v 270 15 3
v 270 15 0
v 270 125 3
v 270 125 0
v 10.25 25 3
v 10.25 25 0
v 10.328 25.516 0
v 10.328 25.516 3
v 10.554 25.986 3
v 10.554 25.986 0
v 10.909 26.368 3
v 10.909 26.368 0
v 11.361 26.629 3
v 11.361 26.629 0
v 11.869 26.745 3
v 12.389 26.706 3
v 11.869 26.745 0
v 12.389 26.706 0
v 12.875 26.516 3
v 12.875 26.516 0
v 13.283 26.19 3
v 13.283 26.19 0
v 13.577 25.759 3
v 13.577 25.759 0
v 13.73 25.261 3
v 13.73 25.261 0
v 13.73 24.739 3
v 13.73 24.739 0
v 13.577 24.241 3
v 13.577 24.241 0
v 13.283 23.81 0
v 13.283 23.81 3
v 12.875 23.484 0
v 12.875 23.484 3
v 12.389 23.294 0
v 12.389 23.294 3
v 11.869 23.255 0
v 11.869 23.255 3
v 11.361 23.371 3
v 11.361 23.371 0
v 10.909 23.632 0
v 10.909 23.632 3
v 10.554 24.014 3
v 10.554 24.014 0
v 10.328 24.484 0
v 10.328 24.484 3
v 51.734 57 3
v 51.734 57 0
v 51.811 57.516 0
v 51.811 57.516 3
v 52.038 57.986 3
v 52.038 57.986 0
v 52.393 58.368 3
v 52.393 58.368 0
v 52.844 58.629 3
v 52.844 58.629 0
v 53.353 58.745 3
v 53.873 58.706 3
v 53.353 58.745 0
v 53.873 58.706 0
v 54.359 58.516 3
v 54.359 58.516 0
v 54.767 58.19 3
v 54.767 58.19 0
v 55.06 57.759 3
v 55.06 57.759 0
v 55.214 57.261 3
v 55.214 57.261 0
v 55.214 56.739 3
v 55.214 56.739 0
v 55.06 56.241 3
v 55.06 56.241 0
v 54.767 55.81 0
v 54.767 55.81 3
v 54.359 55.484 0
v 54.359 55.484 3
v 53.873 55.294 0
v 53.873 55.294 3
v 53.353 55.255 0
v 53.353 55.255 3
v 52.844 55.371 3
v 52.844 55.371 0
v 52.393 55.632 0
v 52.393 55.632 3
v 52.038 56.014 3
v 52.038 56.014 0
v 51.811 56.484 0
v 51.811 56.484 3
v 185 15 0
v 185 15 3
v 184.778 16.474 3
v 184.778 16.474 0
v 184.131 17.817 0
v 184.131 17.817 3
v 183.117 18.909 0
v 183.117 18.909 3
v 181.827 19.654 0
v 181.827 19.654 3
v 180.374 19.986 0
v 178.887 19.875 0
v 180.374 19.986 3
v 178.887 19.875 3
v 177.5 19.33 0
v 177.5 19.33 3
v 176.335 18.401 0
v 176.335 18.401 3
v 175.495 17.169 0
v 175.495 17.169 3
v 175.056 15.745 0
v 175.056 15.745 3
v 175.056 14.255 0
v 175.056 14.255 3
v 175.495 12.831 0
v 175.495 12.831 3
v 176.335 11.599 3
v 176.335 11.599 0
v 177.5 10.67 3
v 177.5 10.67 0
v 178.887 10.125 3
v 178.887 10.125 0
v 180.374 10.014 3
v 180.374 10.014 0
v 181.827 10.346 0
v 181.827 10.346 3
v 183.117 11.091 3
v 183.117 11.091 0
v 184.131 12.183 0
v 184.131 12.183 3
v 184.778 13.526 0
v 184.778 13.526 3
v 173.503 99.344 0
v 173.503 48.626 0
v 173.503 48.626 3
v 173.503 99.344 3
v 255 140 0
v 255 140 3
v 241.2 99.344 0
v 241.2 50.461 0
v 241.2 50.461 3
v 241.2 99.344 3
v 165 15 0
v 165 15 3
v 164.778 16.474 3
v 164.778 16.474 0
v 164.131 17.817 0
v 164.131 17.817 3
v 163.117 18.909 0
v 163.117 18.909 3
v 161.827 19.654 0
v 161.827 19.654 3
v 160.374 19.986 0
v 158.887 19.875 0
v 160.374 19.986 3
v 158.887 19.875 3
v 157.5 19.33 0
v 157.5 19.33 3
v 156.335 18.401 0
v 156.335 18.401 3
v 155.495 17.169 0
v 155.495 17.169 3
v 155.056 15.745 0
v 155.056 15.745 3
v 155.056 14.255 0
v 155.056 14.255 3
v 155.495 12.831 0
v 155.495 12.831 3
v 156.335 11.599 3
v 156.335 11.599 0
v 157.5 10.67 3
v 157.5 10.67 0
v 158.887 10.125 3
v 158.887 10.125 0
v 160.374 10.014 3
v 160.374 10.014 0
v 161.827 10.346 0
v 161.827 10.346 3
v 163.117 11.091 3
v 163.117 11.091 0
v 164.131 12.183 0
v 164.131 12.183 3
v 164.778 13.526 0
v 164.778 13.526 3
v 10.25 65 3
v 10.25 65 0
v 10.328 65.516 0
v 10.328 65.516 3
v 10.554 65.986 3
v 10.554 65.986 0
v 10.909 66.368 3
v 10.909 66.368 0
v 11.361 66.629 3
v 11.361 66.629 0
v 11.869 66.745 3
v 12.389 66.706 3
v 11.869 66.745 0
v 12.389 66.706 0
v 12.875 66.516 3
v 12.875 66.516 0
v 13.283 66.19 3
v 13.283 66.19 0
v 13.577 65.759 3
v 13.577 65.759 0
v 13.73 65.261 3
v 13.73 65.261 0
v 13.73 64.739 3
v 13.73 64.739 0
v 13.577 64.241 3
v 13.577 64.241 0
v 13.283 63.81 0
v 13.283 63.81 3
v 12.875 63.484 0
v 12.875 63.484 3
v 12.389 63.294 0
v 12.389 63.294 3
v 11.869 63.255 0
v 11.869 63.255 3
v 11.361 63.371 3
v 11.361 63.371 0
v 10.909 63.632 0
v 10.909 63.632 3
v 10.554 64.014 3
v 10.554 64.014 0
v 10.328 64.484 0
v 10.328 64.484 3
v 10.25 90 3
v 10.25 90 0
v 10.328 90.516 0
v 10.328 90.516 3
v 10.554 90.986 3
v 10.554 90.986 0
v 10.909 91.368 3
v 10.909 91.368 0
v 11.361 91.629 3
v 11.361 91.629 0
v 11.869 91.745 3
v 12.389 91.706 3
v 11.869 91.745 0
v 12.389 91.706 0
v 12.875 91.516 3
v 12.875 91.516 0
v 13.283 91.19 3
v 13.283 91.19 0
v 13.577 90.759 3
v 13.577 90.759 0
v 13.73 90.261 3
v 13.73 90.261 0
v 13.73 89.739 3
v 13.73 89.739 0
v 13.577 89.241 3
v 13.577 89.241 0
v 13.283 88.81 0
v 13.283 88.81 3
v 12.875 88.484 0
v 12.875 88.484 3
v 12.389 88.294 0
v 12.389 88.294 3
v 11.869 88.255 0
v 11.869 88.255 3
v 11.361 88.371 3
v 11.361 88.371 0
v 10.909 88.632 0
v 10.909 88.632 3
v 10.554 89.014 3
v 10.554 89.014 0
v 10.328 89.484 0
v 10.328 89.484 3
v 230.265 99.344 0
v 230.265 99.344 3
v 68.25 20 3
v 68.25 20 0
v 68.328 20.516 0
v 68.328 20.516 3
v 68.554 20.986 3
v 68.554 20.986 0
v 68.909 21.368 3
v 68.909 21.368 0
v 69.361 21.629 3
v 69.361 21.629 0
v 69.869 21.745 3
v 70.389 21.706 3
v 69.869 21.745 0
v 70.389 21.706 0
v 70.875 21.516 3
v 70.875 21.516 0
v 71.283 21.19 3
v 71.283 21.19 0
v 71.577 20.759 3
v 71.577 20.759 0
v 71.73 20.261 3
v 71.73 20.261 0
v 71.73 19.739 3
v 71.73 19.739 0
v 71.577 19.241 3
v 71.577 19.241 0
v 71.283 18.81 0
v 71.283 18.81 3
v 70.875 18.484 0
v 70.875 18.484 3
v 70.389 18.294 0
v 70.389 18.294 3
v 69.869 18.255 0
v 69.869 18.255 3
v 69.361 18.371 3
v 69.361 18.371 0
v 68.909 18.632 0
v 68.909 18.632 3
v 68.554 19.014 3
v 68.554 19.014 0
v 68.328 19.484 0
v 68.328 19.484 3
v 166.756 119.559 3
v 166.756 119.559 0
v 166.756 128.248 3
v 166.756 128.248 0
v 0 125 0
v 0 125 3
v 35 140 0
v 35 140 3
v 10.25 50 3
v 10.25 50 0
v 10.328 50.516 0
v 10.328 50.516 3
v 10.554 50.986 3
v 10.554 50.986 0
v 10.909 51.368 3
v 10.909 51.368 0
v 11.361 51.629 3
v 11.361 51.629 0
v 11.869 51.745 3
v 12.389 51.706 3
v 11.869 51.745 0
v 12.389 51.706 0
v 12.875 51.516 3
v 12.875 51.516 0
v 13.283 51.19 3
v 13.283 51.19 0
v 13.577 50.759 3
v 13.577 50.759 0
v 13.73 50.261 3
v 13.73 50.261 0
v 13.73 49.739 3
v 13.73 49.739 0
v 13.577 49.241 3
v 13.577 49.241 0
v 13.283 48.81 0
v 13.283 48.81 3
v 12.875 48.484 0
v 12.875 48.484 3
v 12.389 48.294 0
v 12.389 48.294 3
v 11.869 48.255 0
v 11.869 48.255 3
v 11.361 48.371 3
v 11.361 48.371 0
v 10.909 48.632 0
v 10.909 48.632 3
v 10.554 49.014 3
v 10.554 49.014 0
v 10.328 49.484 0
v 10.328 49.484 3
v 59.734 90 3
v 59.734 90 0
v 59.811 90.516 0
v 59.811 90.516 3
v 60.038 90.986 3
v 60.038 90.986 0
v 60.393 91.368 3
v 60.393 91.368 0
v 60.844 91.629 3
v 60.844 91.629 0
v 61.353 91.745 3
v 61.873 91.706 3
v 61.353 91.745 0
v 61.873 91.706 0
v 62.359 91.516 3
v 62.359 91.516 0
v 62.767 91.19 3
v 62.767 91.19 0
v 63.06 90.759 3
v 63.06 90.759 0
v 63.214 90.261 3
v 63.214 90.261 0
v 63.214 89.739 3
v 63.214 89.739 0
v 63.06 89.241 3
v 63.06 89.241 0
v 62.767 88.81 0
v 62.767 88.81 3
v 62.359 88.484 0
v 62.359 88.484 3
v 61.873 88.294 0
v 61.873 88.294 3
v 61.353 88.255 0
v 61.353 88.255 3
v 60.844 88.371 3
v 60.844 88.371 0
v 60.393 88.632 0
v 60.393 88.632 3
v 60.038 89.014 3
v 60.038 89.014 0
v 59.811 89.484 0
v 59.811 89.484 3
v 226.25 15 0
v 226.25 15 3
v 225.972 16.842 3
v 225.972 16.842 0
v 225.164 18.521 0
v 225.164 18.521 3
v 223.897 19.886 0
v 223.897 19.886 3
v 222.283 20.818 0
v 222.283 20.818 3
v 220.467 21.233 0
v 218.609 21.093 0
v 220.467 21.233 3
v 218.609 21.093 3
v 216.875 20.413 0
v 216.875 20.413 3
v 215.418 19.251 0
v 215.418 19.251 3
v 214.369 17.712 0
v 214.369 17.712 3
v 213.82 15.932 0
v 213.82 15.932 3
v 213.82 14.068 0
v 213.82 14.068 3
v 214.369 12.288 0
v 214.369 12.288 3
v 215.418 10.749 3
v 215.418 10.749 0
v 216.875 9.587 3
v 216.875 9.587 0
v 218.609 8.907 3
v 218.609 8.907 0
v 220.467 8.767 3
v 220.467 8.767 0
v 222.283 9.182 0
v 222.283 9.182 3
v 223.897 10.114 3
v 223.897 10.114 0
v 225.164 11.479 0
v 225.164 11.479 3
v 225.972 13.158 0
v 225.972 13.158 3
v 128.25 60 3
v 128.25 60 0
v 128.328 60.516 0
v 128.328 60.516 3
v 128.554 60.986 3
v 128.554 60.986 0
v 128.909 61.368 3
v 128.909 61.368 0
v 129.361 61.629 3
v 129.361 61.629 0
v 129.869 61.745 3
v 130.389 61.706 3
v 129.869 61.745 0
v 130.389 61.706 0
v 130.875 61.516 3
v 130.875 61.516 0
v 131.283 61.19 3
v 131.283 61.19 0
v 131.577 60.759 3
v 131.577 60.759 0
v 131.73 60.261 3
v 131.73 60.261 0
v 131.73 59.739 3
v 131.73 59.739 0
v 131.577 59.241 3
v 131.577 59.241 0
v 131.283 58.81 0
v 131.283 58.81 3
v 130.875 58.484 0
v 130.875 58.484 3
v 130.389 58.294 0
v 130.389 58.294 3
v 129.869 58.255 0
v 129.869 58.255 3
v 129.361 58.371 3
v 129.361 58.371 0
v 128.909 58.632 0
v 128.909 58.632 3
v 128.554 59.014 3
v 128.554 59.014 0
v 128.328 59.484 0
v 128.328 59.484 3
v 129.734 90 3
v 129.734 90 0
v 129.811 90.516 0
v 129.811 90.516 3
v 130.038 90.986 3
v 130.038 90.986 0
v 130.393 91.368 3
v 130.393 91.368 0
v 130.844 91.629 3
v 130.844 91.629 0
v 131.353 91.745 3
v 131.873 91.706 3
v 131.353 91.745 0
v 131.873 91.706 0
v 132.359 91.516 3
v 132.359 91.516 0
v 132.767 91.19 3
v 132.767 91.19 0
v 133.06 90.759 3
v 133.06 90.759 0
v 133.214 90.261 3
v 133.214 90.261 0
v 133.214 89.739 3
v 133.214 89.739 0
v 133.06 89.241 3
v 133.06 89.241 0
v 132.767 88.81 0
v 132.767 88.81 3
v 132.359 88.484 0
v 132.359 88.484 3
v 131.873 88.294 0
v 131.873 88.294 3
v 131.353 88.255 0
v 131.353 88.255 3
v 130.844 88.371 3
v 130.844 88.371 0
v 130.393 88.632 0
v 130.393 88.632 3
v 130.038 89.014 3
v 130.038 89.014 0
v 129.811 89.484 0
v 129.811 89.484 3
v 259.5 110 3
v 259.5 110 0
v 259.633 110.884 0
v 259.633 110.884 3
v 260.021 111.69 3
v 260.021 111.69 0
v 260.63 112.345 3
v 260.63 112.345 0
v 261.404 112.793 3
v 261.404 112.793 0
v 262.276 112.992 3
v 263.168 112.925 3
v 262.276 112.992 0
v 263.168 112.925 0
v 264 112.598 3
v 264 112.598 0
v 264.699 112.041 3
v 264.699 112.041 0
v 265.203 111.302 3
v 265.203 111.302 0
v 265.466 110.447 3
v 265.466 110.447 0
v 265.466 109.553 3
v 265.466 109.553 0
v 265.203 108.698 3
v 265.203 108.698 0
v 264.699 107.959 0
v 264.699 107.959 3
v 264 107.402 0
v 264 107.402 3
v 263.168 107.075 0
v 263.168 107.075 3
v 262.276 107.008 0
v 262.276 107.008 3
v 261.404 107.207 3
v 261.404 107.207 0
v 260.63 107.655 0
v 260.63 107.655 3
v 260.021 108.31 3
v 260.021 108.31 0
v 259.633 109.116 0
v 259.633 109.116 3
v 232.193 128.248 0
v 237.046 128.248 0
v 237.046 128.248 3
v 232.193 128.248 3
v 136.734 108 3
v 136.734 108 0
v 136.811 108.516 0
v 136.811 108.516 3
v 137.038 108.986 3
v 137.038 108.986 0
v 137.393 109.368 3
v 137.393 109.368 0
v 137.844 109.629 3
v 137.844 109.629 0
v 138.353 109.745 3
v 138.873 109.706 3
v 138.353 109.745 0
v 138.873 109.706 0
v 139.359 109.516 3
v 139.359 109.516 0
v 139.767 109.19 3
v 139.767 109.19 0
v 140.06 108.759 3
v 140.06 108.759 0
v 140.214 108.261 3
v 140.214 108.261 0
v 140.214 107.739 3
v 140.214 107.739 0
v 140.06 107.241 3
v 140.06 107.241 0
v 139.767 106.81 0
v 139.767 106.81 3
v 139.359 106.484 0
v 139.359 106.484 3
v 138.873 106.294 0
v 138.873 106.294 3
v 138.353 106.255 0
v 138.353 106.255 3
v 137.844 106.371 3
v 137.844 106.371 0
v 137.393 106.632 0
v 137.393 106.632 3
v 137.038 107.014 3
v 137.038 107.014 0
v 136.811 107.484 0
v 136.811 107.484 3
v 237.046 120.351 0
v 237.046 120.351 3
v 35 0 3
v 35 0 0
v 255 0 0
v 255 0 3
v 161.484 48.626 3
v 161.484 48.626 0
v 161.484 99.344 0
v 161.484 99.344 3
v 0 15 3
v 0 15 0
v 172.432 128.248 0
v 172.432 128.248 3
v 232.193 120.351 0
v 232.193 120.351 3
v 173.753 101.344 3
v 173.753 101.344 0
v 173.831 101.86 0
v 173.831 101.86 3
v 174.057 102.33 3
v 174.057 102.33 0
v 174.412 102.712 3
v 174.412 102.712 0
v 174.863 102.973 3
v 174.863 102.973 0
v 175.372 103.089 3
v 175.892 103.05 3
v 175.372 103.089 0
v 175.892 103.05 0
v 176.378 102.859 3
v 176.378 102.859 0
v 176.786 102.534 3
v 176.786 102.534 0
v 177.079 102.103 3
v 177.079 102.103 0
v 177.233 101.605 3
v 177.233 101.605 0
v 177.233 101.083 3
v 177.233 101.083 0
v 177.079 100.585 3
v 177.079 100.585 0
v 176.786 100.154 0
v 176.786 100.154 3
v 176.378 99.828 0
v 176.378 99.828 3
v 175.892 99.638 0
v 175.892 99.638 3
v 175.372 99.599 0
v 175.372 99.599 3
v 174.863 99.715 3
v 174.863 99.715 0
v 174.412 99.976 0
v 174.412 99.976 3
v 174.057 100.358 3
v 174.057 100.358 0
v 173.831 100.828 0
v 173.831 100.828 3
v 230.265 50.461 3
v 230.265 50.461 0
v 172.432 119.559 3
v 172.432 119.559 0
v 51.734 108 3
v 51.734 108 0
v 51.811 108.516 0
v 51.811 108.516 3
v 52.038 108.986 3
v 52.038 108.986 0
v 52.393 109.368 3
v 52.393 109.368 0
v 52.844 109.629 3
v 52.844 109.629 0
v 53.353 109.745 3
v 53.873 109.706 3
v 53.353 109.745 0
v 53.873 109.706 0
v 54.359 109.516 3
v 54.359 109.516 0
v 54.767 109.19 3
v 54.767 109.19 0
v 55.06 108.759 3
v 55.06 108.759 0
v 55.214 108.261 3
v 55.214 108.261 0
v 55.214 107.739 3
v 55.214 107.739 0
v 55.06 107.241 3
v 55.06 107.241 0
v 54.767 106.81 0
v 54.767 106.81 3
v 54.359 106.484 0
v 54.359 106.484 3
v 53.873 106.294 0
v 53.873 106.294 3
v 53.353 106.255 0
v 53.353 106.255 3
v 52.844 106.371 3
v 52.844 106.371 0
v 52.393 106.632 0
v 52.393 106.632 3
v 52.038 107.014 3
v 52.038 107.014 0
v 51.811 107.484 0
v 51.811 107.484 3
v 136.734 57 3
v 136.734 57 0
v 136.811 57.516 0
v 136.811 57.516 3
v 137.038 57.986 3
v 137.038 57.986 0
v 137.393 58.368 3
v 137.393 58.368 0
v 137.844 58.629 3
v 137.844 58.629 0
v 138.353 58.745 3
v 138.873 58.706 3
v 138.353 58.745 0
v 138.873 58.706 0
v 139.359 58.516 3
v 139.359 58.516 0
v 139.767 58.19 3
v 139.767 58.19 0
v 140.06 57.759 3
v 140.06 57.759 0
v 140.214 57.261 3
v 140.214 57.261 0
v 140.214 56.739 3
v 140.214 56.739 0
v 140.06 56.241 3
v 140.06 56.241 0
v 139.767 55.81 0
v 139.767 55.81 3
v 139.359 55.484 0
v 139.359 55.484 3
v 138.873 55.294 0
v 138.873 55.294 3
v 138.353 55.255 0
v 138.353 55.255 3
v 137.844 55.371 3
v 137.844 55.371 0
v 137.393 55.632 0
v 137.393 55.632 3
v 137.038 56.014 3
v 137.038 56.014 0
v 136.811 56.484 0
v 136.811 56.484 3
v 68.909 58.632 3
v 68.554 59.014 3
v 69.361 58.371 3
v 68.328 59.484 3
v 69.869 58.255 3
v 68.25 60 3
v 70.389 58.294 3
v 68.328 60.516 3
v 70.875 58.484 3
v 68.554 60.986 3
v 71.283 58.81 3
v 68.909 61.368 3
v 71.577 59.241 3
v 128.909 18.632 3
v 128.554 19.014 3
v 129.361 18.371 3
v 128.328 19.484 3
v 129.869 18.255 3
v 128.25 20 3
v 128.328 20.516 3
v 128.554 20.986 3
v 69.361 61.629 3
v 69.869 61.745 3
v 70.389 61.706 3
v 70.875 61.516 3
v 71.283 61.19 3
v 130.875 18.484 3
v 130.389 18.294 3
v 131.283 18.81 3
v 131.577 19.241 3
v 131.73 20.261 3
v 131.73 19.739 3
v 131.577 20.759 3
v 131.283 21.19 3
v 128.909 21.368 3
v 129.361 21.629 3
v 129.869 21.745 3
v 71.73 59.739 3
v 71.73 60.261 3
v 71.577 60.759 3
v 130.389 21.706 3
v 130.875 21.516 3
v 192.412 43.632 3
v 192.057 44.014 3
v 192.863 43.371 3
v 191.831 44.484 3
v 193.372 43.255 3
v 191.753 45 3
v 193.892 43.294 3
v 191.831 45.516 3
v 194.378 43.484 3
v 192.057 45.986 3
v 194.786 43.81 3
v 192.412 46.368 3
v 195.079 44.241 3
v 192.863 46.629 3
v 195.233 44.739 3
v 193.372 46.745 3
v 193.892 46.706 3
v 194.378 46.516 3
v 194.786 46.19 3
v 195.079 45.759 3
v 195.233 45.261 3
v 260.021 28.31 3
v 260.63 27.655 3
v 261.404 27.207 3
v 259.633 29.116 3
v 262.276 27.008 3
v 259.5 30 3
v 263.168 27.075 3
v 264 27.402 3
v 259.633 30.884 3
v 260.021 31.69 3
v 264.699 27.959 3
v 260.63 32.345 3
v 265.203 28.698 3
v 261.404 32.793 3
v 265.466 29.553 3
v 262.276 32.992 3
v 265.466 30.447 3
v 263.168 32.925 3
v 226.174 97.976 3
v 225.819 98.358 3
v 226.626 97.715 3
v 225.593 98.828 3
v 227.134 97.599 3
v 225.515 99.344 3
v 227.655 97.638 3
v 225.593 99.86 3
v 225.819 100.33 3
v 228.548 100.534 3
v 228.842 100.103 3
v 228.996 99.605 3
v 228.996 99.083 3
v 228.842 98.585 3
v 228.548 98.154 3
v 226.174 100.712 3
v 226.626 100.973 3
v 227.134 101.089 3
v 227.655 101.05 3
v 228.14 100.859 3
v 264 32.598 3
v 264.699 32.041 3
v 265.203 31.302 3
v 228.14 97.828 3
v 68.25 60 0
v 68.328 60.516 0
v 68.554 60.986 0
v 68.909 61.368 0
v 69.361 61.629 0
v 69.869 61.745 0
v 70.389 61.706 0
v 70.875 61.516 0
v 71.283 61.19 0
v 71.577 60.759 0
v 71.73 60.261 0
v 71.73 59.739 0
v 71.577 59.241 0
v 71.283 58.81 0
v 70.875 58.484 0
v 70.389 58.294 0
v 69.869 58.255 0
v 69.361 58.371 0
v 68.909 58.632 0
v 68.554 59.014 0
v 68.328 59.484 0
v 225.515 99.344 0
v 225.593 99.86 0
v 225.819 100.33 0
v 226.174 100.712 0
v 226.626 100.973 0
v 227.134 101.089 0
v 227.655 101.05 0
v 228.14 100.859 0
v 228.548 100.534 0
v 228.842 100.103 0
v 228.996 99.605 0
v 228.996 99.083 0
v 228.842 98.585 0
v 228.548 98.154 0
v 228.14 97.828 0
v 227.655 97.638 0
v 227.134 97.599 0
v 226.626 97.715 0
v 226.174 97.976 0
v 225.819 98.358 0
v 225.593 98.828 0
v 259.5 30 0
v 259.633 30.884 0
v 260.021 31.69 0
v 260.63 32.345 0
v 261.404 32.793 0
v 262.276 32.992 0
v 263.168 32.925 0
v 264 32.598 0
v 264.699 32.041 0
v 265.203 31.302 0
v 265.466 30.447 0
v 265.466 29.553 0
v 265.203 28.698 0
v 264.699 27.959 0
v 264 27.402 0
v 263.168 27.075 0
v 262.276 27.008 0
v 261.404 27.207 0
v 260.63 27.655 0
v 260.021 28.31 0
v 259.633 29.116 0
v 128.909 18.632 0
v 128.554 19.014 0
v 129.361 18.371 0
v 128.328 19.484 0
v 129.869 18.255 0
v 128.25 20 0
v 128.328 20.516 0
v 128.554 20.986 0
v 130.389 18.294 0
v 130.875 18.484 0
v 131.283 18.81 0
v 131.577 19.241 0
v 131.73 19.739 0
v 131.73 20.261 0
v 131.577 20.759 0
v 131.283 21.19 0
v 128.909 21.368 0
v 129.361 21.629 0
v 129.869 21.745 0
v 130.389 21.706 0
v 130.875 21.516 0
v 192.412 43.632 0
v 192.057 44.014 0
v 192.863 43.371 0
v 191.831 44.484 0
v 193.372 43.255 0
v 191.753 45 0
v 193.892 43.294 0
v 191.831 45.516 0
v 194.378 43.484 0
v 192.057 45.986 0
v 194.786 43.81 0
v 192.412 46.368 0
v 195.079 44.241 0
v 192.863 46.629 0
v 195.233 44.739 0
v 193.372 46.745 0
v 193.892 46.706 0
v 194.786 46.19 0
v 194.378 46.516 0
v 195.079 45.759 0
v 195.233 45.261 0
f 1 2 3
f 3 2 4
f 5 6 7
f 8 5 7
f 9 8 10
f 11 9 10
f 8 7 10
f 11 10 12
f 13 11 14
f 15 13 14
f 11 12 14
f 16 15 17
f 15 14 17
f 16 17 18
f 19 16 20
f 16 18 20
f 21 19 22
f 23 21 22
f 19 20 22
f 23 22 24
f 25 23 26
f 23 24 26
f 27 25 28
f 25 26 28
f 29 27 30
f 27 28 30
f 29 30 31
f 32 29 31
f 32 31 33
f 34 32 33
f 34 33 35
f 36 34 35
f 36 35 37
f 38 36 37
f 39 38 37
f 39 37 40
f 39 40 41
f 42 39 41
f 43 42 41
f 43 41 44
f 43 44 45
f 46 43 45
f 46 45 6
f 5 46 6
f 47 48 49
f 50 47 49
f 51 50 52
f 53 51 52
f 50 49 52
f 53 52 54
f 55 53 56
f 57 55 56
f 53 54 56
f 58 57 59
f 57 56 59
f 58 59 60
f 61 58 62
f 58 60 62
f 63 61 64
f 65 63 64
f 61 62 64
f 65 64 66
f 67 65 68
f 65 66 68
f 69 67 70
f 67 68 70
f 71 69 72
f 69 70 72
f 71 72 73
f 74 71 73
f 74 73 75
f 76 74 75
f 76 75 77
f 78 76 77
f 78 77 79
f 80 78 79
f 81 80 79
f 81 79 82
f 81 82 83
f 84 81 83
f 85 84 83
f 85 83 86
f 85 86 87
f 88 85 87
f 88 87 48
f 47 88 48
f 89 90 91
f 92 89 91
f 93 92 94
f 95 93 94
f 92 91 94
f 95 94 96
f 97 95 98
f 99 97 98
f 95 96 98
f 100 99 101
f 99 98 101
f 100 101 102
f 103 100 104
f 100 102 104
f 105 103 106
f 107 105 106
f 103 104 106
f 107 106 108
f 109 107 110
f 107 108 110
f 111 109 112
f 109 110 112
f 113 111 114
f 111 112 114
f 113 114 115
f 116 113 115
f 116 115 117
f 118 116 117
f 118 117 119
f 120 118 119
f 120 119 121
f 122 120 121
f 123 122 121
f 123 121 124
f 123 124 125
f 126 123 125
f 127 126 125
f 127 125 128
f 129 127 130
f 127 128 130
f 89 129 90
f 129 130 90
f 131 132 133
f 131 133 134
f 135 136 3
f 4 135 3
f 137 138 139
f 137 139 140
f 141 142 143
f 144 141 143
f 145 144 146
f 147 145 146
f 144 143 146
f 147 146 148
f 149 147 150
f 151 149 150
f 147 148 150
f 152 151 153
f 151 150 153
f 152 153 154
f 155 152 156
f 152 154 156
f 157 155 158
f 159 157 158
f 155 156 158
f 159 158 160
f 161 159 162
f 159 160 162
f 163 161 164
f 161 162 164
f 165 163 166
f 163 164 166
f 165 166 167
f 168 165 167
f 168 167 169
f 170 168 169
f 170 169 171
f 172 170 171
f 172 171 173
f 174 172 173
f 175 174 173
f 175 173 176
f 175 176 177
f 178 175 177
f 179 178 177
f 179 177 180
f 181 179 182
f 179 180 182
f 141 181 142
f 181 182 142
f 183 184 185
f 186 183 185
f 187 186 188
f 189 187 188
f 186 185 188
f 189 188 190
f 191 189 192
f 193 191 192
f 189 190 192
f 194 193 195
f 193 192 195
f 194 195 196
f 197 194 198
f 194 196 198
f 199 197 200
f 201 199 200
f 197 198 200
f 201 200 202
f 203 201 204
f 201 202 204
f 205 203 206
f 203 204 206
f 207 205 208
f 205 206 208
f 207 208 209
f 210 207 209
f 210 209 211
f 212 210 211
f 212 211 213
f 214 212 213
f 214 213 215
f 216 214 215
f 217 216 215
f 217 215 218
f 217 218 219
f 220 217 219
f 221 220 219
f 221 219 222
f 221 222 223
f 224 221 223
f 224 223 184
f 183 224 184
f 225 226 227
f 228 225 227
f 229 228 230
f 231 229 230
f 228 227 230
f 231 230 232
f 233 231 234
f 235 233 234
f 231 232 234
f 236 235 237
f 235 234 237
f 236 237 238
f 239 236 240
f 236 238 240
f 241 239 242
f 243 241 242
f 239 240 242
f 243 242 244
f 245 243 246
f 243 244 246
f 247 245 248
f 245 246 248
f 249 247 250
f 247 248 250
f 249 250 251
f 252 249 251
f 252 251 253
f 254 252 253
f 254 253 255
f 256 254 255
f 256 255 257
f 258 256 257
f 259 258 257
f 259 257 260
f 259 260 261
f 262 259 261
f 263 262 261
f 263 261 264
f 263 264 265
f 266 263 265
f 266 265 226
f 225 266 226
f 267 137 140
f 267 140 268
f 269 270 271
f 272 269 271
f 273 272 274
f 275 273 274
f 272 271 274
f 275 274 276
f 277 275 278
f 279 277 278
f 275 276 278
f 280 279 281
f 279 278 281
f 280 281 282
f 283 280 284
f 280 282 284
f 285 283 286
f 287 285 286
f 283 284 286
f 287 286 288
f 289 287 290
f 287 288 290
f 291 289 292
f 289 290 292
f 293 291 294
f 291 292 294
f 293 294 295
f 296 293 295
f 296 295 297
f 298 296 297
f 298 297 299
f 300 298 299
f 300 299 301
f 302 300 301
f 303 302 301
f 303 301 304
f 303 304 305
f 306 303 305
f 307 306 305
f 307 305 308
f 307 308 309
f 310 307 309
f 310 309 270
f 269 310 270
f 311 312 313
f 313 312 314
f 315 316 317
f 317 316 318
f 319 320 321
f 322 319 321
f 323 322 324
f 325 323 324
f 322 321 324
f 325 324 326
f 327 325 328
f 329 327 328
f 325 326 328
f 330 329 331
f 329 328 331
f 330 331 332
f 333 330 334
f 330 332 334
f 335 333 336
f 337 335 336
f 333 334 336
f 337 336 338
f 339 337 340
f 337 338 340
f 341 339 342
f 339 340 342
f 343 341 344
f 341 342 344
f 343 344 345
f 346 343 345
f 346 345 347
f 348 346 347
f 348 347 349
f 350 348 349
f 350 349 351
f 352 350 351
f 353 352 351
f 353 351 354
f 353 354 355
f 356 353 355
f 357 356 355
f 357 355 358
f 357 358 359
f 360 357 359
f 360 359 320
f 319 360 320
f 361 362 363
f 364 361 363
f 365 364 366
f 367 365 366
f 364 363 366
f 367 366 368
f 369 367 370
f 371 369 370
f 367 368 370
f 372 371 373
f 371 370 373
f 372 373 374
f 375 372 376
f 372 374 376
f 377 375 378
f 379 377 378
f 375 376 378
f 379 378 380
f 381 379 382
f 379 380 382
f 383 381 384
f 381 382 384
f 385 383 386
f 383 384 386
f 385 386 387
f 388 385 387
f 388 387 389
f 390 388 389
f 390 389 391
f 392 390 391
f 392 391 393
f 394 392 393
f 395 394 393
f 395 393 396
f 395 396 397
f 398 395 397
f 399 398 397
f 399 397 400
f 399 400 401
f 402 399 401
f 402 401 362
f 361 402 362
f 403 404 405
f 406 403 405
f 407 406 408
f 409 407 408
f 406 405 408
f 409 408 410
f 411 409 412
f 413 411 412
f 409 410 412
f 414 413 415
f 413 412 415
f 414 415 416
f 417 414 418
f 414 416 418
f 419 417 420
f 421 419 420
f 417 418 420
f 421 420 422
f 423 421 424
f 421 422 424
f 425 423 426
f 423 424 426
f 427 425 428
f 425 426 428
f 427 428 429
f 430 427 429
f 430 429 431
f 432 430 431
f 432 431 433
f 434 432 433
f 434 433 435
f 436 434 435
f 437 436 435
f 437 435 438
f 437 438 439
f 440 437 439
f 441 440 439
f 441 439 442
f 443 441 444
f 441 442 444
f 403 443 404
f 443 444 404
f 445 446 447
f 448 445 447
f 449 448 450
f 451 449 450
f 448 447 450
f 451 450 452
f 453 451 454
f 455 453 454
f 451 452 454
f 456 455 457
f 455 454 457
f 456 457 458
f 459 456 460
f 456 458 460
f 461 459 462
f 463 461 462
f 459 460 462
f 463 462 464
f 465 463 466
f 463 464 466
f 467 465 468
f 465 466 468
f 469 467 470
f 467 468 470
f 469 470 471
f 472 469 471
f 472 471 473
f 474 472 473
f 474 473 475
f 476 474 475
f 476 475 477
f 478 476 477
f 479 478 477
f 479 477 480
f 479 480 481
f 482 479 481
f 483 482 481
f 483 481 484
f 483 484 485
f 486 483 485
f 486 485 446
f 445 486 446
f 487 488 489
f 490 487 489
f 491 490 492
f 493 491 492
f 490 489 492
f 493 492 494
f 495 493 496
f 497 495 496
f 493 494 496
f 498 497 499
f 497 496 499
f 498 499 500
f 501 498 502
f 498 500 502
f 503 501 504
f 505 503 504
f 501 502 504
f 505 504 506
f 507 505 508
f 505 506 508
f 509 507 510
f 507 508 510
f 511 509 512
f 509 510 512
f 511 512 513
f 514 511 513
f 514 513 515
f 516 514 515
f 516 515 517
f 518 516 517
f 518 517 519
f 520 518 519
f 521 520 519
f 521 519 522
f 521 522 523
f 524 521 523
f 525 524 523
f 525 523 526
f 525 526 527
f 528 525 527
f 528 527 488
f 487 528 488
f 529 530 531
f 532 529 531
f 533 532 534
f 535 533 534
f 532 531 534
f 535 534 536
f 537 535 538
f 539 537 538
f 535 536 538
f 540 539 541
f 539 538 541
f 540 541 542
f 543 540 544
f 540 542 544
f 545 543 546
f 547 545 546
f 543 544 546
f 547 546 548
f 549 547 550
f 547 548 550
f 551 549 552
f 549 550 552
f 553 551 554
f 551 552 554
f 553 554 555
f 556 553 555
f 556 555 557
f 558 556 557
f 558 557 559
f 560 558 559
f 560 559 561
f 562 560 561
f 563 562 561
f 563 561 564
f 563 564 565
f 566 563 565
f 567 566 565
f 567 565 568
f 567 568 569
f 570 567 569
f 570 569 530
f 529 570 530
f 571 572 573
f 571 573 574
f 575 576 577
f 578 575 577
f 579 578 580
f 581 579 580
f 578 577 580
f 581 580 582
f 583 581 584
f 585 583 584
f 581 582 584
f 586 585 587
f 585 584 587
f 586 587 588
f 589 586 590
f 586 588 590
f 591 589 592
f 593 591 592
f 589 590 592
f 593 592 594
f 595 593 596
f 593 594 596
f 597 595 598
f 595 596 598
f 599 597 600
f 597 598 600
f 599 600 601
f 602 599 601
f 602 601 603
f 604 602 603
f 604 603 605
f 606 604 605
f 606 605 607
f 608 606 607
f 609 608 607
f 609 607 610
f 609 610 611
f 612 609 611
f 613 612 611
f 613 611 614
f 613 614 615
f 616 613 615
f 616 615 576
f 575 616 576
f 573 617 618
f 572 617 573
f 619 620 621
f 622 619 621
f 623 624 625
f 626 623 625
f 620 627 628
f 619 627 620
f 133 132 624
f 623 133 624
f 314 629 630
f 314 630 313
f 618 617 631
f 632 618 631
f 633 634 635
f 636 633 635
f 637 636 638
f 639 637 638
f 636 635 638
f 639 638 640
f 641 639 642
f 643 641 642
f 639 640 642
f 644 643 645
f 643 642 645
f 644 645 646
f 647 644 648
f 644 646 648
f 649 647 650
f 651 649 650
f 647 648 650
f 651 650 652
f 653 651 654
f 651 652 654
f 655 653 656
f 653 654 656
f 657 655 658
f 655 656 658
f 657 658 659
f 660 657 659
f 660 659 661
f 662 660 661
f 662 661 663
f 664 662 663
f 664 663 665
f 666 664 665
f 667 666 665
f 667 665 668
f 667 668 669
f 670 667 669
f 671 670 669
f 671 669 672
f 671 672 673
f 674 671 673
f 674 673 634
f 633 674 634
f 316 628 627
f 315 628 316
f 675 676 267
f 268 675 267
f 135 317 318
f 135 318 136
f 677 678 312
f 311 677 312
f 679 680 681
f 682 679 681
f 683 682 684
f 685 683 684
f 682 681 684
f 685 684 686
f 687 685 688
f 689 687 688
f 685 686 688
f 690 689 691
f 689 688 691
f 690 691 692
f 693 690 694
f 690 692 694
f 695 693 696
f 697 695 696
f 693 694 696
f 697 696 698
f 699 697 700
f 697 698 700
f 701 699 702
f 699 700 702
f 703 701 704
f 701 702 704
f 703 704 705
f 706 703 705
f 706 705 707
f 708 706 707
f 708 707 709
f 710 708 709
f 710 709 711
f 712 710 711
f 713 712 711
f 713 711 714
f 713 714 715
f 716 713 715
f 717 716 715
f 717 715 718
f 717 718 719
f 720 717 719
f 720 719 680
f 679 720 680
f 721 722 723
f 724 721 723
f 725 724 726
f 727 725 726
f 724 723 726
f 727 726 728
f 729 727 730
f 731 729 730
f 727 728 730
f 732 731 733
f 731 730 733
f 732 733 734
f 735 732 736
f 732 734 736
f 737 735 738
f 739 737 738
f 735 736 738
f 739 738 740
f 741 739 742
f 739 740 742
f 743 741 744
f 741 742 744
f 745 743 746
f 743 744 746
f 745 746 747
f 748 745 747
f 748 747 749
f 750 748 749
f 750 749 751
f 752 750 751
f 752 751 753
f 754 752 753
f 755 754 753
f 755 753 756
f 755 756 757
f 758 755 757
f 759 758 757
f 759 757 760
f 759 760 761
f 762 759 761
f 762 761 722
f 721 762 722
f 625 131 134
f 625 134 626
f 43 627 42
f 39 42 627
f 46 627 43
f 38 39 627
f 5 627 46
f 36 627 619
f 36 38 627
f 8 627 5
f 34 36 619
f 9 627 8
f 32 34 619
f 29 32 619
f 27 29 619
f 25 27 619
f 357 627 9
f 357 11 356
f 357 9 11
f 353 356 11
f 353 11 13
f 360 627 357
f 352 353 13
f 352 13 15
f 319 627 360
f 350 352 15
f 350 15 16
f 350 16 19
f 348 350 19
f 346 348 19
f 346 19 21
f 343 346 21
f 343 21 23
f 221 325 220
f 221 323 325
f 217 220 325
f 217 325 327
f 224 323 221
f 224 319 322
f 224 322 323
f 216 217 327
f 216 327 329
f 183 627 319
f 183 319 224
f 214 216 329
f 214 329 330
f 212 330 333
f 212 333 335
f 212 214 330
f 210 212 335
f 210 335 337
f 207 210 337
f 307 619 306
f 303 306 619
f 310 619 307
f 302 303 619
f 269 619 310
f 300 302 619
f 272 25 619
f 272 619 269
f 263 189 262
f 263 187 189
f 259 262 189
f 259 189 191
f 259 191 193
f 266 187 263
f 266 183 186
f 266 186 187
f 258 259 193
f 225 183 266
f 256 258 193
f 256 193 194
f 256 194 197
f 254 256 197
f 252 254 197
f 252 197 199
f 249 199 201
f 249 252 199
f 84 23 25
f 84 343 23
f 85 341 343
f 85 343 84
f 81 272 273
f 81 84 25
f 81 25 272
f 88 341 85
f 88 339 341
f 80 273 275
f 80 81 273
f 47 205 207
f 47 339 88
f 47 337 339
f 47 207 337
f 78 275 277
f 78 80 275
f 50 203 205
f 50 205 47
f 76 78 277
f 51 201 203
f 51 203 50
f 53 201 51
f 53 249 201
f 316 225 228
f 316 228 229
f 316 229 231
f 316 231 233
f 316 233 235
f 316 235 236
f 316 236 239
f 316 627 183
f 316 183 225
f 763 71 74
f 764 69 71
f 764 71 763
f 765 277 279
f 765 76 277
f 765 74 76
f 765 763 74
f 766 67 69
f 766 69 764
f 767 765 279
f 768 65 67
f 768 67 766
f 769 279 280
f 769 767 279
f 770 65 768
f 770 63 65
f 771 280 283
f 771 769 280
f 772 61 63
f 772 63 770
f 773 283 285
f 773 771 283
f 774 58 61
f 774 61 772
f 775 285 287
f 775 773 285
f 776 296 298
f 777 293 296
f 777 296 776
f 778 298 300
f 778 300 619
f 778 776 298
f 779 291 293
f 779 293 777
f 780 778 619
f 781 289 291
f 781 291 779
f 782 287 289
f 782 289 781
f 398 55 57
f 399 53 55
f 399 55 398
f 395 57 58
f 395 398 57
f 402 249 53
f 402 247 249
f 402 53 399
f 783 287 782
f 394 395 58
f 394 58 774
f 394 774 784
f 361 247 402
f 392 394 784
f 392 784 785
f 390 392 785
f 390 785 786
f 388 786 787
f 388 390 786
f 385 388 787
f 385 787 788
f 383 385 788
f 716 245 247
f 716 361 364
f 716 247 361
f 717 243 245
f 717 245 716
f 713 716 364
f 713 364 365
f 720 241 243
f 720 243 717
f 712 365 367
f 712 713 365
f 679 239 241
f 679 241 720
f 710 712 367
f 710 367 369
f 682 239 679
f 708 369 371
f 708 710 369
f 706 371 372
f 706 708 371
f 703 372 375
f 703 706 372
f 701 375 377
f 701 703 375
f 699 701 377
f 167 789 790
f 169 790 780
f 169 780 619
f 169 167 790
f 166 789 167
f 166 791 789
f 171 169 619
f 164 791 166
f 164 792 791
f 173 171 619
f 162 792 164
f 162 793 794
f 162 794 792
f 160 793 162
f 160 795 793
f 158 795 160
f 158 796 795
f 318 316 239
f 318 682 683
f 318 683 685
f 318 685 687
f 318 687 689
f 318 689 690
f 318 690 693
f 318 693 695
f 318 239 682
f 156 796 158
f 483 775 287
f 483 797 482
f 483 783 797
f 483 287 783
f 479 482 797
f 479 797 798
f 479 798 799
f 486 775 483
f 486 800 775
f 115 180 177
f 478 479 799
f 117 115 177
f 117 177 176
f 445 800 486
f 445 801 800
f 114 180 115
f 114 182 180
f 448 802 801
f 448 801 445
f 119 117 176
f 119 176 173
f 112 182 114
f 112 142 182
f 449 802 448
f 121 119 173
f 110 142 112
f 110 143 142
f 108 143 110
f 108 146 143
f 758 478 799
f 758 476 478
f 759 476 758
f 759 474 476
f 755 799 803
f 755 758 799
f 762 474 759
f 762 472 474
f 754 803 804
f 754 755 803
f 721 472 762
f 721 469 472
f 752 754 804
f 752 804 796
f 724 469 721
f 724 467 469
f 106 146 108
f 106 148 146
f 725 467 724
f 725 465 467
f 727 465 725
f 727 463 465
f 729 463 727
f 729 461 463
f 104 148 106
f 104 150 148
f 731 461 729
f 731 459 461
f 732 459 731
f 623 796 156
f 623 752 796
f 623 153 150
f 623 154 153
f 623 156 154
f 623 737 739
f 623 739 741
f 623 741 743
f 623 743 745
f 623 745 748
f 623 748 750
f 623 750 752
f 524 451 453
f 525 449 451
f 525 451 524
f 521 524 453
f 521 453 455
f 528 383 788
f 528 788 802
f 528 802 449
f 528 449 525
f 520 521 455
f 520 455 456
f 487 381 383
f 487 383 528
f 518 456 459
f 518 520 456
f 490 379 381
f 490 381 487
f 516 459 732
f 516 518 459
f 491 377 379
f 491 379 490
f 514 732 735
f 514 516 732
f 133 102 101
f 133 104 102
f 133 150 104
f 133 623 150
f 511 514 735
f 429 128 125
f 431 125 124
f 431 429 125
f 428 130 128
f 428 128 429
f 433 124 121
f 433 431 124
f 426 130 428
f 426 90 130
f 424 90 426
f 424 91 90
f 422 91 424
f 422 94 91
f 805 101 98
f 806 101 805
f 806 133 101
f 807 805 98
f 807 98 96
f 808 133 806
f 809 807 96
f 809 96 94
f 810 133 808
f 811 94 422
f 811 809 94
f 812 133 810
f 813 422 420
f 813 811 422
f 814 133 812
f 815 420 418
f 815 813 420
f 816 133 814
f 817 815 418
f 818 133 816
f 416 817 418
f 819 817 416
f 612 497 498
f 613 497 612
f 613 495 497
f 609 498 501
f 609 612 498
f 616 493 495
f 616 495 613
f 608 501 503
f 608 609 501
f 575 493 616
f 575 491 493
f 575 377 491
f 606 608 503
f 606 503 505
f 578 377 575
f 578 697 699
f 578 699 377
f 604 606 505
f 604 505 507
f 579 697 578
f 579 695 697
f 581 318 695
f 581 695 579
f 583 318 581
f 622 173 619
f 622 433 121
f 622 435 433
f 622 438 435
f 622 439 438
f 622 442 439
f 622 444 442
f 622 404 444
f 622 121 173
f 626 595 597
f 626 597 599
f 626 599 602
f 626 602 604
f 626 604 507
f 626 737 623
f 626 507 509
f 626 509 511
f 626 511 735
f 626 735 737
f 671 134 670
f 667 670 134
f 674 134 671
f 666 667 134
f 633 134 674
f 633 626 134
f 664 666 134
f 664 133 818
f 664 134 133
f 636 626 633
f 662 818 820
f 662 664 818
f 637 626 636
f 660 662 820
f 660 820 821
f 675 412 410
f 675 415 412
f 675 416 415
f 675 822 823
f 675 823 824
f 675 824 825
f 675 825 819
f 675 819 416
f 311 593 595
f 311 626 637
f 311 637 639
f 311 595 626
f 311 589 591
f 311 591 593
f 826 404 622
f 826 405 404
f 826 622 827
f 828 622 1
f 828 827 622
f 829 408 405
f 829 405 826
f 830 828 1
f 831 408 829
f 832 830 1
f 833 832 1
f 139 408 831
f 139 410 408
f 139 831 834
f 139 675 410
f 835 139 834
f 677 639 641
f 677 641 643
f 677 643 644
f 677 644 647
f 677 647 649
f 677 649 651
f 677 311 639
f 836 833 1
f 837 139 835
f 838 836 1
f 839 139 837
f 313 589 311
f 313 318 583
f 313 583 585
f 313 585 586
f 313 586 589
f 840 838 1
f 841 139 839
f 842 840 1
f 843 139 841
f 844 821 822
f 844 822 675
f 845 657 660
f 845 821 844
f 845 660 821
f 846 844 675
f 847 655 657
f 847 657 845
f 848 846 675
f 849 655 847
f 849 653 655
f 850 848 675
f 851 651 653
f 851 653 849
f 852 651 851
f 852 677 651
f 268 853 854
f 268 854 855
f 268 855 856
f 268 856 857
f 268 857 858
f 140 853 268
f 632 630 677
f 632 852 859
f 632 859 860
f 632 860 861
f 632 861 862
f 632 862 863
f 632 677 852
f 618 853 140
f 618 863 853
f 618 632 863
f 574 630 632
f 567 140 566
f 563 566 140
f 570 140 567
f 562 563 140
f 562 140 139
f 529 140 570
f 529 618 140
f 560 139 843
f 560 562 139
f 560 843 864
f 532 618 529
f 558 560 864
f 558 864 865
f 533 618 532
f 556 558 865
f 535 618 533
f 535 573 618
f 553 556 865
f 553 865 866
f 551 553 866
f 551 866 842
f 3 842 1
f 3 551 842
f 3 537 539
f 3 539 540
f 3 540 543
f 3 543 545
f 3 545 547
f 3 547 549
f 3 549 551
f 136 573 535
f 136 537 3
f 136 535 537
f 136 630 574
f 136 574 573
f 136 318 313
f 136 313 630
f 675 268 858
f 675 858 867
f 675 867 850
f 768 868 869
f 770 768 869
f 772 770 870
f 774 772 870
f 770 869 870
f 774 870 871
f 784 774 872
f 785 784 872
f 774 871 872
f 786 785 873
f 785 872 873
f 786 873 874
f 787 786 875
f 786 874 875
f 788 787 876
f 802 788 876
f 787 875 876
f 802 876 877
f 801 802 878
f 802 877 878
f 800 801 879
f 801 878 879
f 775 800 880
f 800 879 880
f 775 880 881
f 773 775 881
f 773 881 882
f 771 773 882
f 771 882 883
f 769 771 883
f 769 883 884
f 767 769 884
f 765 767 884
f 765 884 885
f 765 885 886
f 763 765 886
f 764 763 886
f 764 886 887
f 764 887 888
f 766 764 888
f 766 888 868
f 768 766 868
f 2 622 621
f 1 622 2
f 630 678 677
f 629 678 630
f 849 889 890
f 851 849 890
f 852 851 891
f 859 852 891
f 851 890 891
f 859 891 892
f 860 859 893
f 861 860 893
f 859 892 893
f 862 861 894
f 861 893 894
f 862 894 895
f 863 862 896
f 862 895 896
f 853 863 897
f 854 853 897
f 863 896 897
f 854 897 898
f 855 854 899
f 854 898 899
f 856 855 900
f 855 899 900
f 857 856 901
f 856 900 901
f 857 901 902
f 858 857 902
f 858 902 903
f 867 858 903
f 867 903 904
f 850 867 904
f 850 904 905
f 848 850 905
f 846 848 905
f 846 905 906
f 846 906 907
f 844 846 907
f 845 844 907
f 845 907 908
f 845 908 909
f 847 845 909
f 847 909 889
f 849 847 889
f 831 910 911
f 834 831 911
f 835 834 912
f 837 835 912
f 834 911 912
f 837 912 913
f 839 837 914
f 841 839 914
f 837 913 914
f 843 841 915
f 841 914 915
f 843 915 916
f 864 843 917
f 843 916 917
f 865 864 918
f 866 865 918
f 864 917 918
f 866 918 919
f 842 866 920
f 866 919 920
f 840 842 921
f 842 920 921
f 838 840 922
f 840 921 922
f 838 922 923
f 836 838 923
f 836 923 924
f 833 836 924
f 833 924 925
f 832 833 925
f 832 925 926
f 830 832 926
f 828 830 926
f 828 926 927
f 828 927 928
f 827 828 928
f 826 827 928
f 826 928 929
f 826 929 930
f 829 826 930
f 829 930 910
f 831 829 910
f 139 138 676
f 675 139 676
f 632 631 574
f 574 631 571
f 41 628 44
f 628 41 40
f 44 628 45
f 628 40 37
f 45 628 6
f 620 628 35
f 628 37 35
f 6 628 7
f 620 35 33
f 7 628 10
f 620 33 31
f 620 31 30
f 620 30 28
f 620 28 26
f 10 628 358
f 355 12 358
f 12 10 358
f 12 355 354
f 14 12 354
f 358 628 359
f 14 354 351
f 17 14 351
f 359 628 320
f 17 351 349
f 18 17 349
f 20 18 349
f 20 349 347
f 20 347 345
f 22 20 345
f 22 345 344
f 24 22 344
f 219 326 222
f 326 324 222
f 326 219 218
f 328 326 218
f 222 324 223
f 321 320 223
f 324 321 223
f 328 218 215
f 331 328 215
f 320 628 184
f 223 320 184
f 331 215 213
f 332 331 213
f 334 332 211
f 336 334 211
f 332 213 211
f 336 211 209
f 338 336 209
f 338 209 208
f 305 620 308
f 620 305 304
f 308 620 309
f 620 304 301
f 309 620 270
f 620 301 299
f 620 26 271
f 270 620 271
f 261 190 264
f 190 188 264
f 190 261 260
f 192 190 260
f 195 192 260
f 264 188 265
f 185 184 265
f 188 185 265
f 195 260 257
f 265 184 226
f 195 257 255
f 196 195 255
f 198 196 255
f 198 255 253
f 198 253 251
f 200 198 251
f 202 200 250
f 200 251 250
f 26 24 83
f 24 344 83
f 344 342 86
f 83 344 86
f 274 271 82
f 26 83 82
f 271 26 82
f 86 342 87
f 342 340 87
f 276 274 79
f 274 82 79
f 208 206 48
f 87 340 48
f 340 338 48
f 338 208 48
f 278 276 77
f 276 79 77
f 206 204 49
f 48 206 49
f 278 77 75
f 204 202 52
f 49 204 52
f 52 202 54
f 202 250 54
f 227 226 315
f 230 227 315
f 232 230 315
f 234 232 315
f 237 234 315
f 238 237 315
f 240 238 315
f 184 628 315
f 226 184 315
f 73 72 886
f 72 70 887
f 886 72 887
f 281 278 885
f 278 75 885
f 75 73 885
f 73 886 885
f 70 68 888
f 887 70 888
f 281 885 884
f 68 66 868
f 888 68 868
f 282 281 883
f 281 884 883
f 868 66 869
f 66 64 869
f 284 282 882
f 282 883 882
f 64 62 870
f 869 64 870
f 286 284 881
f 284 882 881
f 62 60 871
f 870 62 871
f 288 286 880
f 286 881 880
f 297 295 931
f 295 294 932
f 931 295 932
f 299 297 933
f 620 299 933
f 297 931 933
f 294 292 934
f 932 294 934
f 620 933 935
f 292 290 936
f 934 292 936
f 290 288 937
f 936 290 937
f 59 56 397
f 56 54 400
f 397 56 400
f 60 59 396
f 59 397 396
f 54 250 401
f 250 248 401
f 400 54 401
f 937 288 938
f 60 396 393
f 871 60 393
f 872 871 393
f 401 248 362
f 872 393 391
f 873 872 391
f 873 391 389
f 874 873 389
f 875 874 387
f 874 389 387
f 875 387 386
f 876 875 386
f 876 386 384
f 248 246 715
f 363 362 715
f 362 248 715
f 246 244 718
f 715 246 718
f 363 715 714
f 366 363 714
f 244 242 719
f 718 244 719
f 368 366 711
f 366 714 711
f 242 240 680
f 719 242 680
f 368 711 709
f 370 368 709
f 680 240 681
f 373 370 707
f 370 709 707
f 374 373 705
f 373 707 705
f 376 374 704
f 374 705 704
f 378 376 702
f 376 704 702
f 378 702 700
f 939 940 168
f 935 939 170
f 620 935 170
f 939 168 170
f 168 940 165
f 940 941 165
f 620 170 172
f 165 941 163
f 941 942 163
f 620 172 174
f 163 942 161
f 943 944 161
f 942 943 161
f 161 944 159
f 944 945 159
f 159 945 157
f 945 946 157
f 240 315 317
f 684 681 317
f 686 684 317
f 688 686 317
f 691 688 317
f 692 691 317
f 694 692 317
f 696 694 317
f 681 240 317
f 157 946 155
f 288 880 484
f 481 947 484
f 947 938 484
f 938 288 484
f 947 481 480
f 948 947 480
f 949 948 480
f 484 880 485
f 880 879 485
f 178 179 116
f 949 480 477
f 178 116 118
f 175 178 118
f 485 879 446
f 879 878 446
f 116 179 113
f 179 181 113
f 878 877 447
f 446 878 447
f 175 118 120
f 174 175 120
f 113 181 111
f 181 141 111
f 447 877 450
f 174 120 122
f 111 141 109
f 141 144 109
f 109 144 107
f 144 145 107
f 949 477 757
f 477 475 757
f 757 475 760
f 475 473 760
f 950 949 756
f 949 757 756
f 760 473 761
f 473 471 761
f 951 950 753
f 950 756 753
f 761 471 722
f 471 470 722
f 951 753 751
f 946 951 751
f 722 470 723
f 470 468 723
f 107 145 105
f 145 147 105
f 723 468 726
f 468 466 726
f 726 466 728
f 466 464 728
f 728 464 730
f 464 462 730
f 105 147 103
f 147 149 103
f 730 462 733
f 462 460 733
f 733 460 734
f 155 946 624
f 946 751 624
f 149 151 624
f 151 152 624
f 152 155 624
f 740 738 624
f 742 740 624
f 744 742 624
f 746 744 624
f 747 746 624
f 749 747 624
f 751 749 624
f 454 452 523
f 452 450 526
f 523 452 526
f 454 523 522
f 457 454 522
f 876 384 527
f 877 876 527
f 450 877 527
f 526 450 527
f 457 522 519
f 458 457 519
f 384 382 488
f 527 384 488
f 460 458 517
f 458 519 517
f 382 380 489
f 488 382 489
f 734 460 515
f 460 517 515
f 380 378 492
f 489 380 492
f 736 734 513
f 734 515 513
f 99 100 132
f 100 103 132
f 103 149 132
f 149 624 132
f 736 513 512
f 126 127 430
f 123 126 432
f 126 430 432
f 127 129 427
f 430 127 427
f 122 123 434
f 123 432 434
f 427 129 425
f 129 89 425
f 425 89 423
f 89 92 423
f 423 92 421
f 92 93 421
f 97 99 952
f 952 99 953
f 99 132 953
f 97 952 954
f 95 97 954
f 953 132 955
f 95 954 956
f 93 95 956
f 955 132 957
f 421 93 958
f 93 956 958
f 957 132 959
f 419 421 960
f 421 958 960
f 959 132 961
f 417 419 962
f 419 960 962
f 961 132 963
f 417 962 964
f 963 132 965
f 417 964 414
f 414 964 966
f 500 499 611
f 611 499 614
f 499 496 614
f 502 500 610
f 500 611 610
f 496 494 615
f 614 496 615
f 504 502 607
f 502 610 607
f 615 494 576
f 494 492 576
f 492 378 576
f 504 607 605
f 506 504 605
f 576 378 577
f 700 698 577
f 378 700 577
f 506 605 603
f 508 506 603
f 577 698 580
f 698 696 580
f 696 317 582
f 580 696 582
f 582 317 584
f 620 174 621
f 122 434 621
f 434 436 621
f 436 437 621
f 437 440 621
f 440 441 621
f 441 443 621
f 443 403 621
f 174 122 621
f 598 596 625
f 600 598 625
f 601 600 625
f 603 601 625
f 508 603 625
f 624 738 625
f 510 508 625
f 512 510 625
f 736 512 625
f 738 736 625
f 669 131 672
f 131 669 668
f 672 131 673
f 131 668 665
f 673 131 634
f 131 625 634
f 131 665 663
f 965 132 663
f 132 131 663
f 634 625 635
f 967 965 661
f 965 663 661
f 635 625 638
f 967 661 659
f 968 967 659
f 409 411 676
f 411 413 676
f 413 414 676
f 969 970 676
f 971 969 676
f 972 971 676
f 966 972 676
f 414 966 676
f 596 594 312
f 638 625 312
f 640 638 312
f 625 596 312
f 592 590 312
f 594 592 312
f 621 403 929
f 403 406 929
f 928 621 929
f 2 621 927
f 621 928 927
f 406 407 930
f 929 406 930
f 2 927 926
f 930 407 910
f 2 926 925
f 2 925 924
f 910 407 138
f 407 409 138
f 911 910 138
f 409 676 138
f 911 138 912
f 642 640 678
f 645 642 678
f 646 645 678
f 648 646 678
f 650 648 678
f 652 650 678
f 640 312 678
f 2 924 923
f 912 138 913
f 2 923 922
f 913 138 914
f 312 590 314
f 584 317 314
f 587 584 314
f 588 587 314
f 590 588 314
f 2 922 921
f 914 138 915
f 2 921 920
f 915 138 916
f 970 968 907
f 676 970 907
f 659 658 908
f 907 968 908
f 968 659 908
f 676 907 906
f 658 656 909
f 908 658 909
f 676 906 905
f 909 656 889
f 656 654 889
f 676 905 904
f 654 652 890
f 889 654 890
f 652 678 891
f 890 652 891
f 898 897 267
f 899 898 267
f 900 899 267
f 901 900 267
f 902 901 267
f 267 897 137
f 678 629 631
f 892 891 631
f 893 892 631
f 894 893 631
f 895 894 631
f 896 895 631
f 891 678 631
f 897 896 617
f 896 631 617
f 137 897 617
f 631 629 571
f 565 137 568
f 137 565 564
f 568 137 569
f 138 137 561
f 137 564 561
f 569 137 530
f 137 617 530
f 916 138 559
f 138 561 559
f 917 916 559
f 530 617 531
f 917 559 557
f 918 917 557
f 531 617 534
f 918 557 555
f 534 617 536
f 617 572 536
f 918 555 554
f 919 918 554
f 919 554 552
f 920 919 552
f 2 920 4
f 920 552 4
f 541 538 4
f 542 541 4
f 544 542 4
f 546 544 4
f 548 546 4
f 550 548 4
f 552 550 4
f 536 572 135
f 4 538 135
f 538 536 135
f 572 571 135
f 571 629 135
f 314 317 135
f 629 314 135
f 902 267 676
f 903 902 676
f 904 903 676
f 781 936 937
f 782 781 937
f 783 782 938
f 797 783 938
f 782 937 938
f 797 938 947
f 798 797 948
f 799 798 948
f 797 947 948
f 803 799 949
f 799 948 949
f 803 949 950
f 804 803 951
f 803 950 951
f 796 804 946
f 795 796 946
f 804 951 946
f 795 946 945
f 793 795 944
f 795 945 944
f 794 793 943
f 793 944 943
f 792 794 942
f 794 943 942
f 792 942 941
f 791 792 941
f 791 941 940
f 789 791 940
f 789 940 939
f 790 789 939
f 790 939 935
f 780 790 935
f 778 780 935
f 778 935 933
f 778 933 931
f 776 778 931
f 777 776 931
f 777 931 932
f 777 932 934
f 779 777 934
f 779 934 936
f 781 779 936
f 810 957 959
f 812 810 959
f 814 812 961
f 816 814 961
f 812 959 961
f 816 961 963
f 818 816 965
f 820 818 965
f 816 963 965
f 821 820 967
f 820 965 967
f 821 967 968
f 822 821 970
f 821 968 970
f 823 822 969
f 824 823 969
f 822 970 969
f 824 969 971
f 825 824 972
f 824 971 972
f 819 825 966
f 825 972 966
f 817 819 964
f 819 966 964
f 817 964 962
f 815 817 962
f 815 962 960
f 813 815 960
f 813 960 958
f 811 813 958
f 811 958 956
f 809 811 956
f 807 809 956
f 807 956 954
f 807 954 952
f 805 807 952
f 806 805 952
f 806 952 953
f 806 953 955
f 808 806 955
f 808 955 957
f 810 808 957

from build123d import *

# Parameters (mm, degrees)
SKETCH1_W           = 270
SKETCH1_H           = 140
BOSS_EXTRUDE1_DEPTH = 3
SKETCH2_R           = 6.25
SKETCH2_R_2         = 5
CUT_EXTRUDE1_DEPTH  = 3
CUT_EXTRUDE3_DEPTH  = 3
SKETCH6_W           = 12.019056062
SKETCH6_H           = 50.71745121
SKETCH6_W_2         = 10.934400461
SKETCH6_H_2         = 48.883202059
SKETCH6_W_3         = 5.676391459
SKETCH6_H_3         = 8.689402458
SKETCH6_W_4         = 4.853726277
SKETCH6_H_4         = 7.896916359
CUT_EXTRUDE5_DEPTH  = 10
SKETCH7_R           = 1.75
CUT_EXTRUDE8_DEPTH  = 10
SKETCH8_R           = 1.75
CUT_EXTRUDE9_DEPTH  = 10
SKETCH9_R           = 1.75
SKETCH9_R_2         = 3
CUT_EXTRUDE10_DEPTH = 10
SKETCH10_R          = 1.75
CUT_EXTRUDE11_DEPTH = 10


with BuildPart() as part:
    # Sketch1 → Boss-Extrude1 (new body)
    with BuildSketch(Plane.XY):
        with Locations((135, 70)):
            Rectangle(SKETCH1_W, SKETCH1_H)
    extrude(amount=BOSS_EXTRUDE1_DEPTH)

    # Sketch2 → Cut-Extrude1 (cut)
    with BuildSketch(Plane.XY.offset(3)):
        with Locations((220, 15)):
            Circle(SKETCH2_R)
        with Locations((180, 15)):
            Circle(SKETCH2_R_2)
        with Locations((160, 15)):
            Circle(SKETCH2_R_2)
    extrude(amount=-CUT_EXTRUDE1_DEPTH, mode=Mode.SUBTRACT)

    # Sketch5 → Cut-Extrude3 (cut)
    with BuildSketch(Plane.XY.offset(3)):
        Polygon((255, 140), (270, 125), (270, 140), align=None)
        Polygon((0, 140), (0, 125), (35, 140), align=None)
        Polygon((270, 0), (255, 0), (270, 15), align=None)
        Polygon((0, 15), (35, 0), (0, 0), align=None)
    extrude(amount=-CUT_EXTRUDE3_DEPTH, mode=Mode.SUBTRACT)

    # Sketch6 → Cut-Extrude5 (cut)
    with BuildSketch(Plane(origin=(0, 0, 0), x_dir=(-1, 0, 0), z_dir=(0, 0, -1))):
        with Locations((-167.493263023, 73.985112913)):
            Rectangle(SKETCH6_W, SKETCH6_H)
        with Locations((-235.732393676, 74.902237489)):
            Rectangle(SKETCH6_W_2, SKETCH6_H_2)
        with Locations((-169.594169913, 123.903401406)):
            Rectangle(SKETCH6_W_3, SKETCH6_H_3)
        with Locations((-234.619547555, 124.299644456)):
            Rectangle(SKETCH6_W_4, SKETCH6_H_4)
    extrude(amount=-CUT_EXTRUDE5_DEPTH, mode=Mode.SUBTRACT)

    # Sketch7 → Cut-Extrude8 (cut)
    with BuildSketch(Plane(origin=(0, 0, 0), x_dir=(-1, 0, 0), z_dir=(0, 0, -1))):
        with Locations((-53.483734992, 57)):
            Circle(SKETCH7_R)
        with Locations((-138.483734992, 57)):
            Circle(SKETCH7_R)
        with Locations((-138.483734992, 108)):
            Circle(SKETCH7_R)
        with Locations((-53.483734992, 108)):
            Circle(SKETCH7_R)
    extrude(amount=-CUT_EXTRUDE8_DEPTH, mode=Mode.SUBTRACT)

    # Sketch8 → Cut-Extrude9 (cut)
    with BuildSketch(Plane(origin=(0, 0, 0), x_dir=(-1, 0, 0), z_dir=(0, 0, -1))):
        with Locations((-12, 25)):
            Circle(SKETCH8_R)
        with Locations((-12, 65)):
            Circle(SKETCH8_R)
        with Locations((-12, 50)):
            Circle(SKETCH8_R)
        with Locations((-12, 90)):
            Circle(SKETCH8_R)
    extrude(amount=-CUT_EXTRUDE9_DEPTH, mode=Mode.SUBTRACT)

    # Sketch9 → Cut-Extrude10 (cut)
    with BuildSketch(Plane(origin=(0, 0, 0), x_dir=(-1, 0, 0), z_dir=(0, 0, -1))):
        with Locations((-70, 20)):
            Circle(SKETCH9_R)
        with Locations((-130, 20)):
            Circle(SKETCH9_R)
        with Locations((-130, 60)):
            Circle(SKETCH9_R)
        with Locations((-70, 60)):
            Circle(SKETCH9_R)
        with Locations((-61.483734992, 90)):
            Circle(SKETCH9_R)
        with Locations((-131.483734992, 90)):
            Circle(SKETCH9_R)
        with Locations((-262.5, 30)):
            Circle(SKETCH9_R_2)
        with Locations((-262.5, 110)):
            Circle(SKETCH9_R_2)
    extrude(amount=-CUT_EXTRUDE10_DEPTH, mode=Mode.SUBTRACT)

    # Sketch10 → Cut-Extrude11 (cut)
    with BuildSketch(Plane(origin=(0, 0, 0), x_dir=(-1, 0, 0), z_dir=(0, 0, -1))):
        with Locations((-193.502791054, 45)):
            Circle(SKETCH10_R)
        with Locations((-175.502791054, 101.343838518)):
            Circle(SKETCH10_R)
        with Locations((-227.265193445, 99.343838518)):
            Circle(SKETCH10_R)
    extrude(amount=-CUT_EXTRUDE11_DEPTH, mode=Mode.SUBTRACT)


solid = part.part
